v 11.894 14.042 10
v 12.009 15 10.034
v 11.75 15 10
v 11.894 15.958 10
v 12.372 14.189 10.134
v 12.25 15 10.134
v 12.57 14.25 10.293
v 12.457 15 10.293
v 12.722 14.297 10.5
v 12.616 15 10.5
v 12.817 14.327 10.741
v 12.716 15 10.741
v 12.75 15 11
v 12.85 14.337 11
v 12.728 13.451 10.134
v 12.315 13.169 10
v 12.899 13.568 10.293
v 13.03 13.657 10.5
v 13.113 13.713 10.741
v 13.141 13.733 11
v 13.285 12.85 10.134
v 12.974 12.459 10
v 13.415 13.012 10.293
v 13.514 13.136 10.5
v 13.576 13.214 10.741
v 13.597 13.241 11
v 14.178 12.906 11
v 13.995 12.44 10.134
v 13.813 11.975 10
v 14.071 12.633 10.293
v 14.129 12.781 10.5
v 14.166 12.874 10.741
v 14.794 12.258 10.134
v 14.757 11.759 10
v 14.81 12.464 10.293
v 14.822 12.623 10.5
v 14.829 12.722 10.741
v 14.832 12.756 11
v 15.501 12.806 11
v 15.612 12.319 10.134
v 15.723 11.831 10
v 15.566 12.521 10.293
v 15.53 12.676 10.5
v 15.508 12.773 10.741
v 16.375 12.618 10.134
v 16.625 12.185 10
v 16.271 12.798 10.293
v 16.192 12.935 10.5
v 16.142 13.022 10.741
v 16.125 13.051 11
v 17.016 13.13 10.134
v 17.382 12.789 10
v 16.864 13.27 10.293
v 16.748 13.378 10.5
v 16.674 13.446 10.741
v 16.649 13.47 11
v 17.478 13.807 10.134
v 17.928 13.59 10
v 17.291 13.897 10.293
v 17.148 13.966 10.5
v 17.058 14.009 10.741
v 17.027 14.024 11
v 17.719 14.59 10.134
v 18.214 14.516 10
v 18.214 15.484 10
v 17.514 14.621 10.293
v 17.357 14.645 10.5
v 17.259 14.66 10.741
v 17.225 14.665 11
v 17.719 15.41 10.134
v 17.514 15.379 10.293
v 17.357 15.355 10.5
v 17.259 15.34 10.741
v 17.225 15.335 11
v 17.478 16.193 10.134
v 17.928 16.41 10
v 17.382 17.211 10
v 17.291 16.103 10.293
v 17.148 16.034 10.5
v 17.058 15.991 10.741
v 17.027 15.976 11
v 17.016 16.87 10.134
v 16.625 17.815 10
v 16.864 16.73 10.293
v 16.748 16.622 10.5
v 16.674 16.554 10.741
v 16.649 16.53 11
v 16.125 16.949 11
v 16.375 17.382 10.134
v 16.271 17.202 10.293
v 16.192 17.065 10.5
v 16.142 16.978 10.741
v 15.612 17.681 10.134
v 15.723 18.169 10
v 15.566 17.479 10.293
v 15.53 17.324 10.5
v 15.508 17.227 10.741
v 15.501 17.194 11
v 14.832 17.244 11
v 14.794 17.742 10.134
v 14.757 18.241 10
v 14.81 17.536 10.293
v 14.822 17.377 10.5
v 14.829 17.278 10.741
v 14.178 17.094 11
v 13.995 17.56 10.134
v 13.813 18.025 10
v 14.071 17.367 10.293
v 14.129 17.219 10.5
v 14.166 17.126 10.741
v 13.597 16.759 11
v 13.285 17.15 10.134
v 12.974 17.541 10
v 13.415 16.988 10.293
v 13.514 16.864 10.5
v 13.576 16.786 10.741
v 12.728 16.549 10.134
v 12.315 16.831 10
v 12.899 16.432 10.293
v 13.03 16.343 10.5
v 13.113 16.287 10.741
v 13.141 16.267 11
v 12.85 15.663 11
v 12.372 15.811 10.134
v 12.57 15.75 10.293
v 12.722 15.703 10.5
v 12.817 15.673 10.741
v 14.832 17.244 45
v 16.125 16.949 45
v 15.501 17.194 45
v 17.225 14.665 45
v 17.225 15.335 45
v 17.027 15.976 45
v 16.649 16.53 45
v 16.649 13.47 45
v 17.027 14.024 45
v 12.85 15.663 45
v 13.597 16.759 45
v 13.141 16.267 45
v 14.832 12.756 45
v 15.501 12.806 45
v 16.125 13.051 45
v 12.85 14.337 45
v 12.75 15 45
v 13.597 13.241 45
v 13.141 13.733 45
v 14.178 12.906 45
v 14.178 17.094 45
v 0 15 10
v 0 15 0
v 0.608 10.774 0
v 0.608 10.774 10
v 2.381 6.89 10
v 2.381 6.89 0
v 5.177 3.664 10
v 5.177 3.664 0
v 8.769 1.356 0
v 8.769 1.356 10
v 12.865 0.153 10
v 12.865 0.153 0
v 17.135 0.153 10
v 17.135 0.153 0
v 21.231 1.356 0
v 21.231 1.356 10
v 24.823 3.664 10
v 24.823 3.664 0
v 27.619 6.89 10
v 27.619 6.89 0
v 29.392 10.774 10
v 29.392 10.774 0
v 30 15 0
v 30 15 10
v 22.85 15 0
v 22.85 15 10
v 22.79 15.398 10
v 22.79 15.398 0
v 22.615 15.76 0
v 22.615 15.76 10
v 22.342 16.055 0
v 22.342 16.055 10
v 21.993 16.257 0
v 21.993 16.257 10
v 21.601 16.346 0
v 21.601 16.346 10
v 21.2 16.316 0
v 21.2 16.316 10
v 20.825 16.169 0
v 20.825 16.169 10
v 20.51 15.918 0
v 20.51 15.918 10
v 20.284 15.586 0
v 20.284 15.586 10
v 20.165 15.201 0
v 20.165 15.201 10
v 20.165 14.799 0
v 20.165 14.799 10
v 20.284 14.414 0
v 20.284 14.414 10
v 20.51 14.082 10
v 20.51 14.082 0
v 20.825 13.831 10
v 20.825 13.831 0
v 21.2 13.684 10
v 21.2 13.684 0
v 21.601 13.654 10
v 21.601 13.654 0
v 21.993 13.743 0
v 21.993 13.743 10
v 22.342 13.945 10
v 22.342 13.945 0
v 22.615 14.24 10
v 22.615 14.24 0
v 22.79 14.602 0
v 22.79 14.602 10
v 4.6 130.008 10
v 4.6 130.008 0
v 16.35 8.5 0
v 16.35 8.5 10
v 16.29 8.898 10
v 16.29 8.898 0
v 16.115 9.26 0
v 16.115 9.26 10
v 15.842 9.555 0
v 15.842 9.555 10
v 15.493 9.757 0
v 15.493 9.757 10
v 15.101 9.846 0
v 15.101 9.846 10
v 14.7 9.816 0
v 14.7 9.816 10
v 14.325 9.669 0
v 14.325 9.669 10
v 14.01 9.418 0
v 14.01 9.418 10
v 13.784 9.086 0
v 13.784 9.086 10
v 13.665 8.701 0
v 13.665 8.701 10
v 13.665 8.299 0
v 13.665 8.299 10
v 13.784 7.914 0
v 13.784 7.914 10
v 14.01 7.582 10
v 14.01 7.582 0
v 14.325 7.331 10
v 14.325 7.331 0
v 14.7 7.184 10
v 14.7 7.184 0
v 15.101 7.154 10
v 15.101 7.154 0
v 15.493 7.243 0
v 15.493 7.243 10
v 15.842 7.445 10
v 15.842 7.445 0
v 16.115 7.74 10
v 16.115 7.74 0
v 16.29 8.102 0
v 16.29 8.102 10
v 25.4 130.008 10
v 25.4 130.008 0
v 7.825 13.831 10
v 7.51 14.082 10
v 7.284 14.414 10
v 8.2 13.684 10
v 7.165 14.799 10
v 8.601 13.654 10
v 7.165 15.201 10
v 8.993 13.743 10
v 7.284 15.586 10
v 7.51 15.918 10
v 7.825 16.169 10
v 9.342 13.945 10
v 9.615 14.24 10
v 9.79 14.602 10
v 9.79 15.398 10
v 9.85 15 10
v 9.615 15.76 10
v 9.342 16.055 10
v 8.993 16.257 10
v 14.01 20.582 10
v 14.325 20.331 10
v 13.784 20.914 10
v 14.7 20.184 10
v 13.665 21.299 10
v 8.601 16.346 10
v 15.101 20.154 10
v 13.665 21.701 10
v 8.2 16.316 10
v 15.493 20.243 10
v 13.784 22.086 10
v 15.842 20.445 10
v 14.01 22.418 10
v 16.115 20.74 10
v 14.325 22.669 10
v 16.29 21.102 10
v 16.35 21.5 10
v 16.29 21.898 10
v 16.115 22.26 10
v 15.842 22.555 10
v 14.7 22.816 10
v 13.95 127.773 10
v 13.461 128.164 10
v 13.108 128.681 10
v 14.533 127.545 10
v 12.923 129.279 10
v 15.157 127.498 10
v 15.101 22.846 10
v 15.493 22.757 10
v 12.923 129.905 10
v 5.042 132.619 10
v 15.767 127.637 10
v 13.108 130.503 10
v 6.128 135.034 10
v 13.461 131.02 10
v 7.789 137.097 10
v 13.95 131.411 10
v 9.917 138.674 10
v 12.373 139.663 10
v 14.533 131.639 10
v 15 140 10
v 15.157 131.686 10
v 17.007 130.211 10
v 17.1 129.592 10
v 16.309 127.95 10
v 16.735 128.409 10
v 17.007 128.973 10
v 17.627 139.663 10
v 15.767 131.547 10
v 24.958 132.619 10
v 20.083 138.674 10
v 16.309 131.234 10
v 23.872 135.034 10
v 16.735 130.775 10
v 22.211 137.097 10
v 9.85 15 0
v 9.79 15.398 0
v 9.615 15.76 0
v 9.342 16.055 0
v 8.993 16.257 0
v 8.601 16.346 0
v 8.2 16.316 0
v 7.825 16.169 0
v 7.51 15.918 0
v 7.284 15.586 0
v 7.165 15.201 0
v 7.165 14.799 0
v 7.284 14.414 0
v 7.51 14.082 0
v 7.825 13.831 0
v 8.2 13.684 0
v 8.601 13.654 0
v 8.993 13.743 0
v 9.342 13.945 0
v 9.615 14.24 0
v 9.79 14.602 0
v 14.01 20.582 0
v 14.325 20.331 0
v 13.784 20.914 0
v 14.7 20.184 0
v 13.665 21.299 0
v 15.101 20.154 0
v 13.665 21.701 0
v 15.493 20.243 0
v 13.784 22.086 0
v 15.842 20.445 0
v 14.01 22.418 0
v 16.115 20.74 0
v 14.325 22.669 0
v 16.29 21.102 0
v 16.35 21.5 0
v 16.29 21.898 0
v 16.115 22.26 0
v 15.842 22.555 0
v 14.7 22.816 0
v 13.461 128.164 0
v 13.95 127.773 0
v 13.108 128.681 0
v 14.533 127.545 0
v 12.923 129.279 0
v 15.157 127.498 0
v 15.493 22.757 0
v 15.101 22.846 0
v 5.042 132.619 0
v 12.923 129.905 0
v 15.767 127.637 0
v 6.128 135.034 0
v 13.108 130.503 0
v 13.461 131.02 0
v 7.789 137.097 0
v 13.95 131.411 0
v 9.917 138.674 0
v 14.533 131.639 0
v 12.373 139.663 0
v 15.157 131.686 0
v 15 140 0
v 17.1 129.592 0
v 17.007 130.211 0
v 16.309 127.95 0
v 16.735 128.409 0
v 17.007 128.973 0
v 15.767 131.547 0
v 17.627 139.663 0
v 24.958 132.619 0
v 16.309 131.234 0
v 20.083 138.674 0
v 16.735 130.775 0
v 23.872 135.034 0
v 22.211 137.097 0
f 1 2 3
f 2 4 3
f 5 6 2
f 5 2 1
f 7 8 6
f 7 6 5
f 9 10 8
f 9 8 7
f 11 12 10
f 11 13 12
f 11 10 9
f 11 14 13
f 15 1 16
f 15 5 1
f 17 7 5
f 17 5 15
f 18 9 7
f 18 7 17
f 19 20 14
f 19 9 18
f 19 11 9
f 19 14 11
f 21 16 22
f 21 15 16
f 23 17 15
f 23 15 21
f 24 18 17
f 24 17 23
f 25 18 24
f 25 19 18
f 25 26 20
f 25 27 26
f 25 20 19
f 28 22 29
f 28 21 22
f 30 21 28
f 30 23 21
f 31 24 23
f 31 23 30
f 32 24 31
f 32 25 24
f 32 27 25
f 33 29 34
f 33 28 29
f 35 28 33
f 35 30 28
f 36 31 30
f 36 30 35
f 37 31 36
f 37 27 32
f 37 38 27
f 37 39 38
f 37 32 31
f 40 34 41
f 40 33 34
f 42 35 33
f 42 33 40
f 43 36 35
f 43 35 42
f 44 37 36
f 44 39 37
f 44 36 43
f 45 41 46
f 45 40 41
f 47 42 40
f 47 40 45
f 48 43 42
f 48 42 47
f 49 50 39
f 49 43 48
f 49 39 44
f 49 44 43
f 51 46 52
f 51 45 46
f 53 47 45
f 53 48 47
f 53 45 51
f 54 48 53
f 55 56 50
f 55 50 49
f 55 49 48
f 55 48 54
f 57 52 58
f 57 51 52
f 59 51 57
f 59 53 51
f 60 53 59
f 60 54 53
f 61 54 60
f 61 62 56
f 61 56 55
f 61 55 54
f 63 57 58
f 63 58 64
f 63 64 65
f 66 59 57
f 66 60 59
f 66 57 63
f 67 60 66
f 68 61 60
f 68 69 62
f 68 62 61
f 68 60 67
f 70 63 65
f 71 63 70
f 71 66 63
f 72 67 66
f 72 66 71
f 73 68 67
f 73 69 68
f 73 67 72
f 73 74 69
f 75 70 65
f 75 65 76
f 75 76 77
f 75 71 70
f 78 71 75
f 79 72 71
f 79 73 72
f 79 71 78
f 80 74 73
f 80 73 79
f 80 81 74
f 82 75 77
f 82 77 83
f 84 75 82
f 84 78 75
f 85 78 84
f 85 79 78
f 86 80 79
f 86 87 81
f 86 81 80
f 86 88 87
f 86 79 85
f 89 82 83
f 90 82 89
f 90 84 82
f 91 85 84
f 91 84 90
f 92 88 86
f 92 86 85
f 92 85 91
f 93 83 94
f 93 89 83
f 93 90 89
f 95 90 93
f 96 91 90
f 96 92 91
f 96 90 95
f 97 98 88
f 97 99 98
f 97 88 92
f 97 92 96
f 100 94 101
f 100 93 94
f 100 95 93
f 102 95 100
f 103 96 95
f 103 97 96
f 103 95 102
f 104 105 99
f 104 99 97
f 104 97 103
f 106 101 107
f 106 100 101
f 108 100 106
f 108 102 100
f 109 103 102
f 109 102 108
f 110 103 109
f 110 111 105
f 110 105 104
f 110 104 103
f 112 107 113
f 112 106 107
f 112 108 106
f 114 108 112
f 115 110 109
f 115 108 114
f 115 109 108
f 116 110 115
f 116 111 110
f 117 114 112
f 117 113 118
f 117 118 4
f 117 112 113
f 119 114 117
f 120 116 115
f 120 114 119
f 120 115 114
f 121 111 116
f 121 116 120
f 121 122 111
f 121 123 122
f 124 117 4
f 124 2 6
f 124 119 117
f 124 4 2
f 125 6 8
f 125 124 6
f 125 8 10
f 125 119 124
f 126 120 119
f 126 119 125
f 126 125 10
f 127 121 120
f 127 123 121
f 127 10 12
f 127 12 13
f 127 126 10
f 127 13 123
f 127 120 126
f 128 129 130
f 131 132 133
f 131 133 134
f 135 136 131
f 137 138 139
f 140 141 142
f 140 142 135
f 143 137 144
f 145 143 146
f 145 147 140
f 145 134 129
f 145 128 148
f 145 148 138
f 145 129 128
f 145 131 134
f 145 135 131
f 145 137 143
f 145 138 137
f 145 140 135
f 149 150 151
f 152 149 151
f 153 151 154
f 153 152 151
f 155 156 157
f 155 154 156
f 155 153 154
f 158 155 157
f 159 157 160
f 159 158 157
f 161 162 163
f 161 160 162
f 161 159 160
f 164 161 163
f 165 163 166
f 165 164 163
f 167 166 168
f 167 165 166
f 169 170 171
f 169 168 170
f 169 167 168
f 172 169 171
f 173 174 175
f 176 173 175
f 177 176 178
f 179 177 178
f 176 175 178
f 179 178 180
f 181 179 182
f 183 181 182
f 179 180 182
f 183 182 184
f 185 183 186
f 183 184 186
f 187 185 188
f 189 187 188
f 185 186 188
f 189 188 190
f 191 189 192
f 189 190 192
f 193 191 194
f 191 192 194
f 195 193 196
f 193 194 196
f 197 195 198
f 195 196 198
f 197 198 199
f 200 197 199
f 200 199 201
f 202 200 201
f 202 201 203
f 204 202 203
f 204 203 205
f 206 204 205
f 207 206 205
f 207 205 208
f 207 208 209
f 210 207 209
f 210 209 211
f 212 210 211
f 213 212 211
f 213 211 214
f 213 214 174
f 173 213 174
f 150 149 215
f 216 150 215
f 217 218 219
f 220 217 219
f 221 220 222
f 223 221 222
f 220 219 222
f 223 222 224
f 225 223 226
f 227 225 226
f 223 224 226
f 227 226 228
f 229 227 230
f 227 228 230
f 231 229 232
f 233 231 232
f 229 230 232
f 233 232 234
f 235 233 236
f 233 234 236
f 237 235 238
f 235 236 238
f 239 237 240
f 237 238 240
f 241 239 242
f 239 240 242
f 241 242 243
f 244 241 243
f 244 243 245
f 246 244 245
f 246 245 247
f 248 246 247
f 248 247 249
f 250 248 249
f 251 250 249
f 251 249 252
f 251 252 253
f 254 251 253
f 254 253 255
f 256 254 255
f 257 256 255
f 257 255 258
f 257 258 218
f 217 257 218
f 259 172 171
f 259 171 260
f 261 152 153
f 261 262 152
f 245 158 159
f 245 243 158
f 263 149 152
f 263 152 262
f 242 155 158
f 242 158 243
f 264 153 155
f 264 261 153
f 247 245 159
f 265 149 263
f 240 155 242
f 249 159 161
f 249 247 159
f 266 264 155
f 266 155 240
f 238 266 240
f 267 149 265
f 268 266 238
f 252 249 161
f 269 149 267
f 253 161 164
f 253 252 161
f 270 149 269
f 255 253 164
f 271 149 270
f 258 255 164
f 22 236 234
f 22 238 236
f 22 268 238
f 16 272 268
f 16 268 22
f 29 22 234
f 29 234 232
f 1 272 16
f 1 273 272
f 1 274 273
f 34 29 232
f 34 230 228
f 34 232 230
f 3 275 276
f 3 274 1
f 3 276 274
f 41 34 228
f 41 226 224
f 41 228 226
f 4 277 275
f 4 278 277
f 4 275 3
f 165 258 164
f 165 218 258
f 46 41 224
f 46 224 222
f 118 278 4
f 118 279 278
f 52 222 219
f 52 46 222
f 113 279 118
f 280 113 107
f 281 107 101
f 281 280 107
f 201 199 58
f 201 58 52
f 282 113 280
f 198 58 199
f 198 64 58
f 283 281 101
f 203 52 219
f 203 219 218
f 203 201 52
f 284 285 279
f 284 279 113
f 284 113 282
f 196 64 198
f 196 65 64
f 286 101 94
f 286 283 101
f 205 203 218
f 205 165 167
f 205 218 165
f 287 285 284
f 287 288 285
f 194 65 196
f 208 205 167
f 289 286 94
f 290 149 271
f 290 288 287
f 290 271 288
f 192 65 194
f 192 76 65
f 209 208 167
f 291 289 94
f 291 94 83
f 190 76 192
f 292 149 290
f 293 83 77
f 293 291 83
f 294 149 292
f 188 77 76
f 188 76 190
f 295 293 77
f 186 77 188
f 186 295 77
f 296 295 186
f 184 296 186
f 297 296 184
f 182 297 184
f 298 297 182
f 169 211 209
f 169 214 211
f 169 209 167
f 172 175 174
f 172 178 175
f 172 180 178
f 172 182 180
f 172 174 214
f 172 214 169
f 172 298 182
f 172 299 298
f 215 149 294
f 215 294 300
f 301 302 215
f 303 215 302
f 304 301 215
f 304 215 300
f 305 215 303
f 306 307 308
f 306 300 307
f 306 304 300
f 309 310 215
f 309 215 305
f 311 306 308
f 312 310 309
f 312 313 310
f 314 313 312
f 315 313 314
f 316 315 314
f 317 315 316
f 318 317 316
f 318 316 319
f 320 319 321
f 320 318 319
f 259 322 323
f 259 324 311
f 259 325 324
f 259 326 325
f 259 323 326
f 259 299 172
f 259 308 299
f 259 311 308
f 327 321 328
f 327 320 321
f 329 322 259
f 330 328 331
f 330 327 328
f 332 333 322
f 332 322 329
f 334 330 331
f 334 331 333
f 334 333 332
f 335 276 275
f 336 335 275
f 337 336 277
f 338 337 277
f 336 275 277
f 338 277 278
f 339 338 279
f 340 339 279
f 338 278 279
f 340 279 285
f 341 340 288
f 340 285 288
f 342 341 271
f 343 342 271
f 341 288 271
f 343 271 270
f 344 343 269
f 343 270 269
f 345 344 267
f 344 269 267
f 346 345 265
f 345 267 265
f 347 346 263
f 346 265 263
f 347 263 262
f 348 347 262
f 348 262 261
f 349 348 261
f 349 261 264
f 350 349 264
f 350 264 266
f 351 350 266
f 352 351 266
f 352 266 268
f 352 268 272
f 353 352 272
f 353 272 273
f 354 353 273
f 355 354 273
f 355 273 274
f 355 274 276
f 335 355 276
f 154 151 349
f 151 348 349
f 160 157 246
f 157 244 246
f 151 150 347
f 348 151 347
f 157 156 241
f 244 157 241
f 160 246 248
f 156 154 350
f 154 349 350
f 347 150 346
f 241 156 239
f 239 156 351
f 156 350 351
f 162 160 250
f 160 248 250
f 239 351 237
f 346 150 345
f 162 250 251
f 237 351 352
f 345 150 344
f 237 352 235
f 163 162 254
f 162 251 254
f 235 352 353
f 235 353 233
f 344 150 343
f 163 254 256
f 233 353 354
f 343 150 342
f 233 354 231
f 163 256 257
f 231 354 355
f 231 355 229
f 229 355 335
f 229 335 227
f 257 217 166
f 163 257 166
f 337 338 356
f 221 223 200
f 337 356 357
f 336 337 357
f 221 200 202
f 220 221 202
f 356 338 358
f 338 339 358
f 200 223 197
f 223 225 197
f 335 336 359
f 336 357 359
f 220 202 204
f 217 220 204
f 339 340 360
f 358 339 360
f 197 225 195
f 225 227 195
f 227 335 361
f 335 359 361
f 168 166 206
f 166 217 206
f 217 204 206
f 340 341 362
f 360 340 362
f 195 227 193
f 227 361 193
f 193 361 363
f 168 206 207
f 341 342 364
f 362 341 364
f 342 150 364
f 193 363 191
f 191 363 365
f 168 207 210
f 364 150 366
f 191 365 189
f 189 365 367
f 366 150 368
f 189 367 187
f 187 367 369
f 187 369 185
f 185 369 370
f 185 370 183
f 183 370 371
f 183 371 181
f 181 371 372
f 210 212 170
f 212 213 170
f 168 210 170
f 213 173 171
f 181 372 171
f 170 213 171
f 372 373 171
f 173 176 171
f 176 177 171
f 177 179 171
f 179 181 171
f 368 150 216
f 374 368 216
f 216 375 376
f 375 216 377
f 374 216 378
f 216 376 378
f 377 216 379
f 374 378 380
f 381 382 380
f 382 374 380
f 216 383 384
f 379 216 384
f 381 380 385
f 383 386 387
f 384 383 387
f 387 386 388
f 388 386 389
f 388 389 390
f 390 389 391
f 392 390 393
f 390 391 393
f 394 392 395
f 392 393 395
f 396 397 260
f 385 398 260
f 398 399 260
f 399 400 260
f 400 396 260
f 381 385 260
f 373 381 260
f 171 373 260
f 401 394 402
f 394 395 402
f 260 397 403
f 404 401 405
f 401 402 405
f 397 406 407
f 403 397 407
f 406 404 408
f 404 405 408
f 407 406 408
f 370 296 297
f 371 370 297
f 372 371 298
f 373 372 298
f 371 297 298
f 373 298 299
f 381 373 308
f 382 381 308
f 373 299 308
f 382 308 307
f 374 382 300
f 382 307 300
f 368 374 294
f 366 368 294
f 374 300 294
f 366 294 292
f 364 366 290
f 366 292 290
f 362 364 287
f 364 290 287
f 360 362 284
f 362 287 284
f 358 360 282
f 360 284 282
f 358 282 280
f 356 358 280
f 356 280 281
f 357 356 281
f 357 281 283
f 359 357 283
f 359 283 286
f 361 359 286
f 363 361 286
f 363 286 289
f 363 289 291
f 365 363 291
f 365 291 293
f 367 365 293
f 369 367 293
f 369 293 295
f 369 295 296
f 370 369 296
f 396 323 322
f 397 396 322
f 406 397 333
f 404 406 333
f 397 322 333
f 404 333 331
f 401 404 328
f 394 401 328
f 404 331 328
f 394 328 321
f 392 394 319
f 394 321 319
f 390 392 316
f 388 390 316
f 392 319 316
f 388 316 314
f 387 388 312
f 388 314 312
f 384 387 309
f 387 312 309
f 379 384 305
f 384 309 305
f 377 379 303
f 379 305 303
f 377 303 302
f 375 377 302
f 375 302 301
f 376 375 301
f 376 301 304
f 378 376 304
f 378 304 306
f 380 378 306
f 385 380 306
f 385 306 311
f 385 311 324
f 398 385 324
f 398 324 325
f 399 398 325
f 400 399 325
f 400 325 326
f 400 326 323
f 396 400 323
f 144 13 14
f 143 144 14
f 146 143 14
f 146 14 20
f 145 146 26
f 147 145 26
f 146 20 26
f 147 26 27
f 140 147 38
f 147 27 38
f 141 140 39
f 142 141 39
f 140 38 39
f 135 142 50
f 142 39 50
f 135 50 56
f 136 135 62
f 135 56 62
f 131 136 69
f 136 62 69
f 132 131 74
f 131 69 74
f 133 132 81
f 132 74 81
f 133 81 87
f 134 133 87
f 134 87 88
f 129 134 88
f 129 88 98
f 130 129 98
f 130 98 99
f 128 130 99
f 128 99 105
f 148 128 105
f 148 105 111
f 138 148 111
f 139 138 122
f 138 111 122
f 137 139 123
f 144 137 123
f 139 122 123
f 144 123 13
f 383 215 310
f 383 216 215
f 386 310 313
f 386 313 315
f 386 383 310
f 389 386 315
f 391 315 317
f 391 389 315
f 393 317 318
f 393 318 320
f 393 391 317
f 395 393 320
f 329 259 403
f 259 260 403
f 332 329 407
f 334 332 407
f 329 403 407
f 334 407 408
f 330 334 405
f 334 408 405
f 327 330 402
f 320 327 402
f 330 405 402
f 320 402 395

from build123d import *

# Parameters (mm, degrees)
SKETCH_1_W          = 30
SKETCH_1_H          = 140
EXTRUDE_1_DEPTH     = 10
FILLET_1_RADIUS     = 15
FILLET_1_LENGTH     = 10
CUT_EXTRUDE_1_DEPTH = 10
FILLET_2_R          = 10.407997
SKETCH_3_R          = 2.1
CUT_EXTRUDE_2_DEPTH = 144.527000944
SKETCH_4_R          = 1.35
CUT_EXTRUDE_3_DEPTH = 144.527000944
SKETCH_5_R          = 2.25
EXTRUDE_2_DEPTH     = 35
FILLET_3_R          = 1


with BuildPart() as part:
    # 草图1 → 凸台-拉伸1 (new body)
    with BuildSketch(Plane.XY):
        with Locations((15, 70)):
            Rectangle(SKETCH_1_W, SKETCH_1_H)
    extrude(amount=EXTRUDE_1_DEPTH)

    # 圆角1: full round fillet: the end face becomes a half cylinder, R = half its width
    fillet_1_face = Plane((15, 0, 5), x_dir=(0, 0, 1), z_dir=(0, -1, 0))  # on the end face: x along it, z out of the body
    fillet_1_slab = fillet_1_face.offset(-FILLET_1_RADIUS / 2) * Box(FILLET_1_LENGTH, 2 * FILLET_1_RADIUS, FILLET_1_RADIUS, mode=Mode.PRIVATE)  # the body's end, R deep
    fillet_1_round = Plane((15, 15, 5), x_dir=(0, -1, 0), z_dir=(0, 0, 1)) * Cylinder(FILLET_1_RADIUS, FILLET_1_LENGTH, mode=Mode.PRIVATE)  # its axis R under the face
    add(fillet_1_slab - fillet_1_round, mode=Mode.SUBTRACT)

    # 草图2 → 切除-拉伸1 (cut)
    with BuildSketch(Plane.XY.offset(10)):
        Polygon((0, 15), (5, 140), (0, 140), align=None)
        Polygon((30, 15), (25, 140), (30, 140), align=None)
    extrude(amount=-CUT_EXTRUDE_1_DEPTH, mode=Mode.SUBTRACT)

    # 圆角2
    fillet_2_edges = [part.edges().sort_by_distance(p)[0] for p in [
        (5, 140, 5),
        (25, 140, 5),
    ]]
    fillet(fillet_2_edges, radius=FILLET_2_R - 0.0001)  # a hair under: the kernel refuses the full size

    # 草图3 → 切除-拉伸2 (cut, through all)
    with BuildSketch(Plane.XY.offset(10)):
        with Locations((15, 129.592003197)):
            Circle(SKETCH_3_R)
    extrude(amount=-CUT_EXTRUDE_2_DEPTH, mode=Mode.SUBTRACT)

    # 草图4 → 切除-拉伸3 (cut, through all)
    with BuildSketch(Plane.XY.offset(10)):
        with Locations((15, 8.5)):
            Circle(SKETCH_4_R)
        with Locations((21.5, 15)):
            Circle(SKETCH_4_R)
        with Locations((15, 21.5)):
            Circle(SKETCH_4_R)
        with Locations((8.5, 15)):
            Circle(SKETCH_4_R)
    extrude(amount=-CUT_EXTRUDE_3_DEPTH, mode=Mode.SUBTRACT)

    # 草图5 → 凸台-拉伸2 (add)
    with BuildSketch(Plane.XY.offset(10)):
        with Locations(Location((15, 15, 0), (0, 0, 180))):
            Circle(SKETCH_5_R)
    extrude(amount=EXTRUDE_2_DEPTH)

    # 圆角3
    fillet_3_edges = [part.edges().sort_by_distance(p)[0] for p in [
        (17.25, 15, 10),
    ]]
    fillet(fillet_3_edges, radius=FILLET_3_R)


solid = part.part
